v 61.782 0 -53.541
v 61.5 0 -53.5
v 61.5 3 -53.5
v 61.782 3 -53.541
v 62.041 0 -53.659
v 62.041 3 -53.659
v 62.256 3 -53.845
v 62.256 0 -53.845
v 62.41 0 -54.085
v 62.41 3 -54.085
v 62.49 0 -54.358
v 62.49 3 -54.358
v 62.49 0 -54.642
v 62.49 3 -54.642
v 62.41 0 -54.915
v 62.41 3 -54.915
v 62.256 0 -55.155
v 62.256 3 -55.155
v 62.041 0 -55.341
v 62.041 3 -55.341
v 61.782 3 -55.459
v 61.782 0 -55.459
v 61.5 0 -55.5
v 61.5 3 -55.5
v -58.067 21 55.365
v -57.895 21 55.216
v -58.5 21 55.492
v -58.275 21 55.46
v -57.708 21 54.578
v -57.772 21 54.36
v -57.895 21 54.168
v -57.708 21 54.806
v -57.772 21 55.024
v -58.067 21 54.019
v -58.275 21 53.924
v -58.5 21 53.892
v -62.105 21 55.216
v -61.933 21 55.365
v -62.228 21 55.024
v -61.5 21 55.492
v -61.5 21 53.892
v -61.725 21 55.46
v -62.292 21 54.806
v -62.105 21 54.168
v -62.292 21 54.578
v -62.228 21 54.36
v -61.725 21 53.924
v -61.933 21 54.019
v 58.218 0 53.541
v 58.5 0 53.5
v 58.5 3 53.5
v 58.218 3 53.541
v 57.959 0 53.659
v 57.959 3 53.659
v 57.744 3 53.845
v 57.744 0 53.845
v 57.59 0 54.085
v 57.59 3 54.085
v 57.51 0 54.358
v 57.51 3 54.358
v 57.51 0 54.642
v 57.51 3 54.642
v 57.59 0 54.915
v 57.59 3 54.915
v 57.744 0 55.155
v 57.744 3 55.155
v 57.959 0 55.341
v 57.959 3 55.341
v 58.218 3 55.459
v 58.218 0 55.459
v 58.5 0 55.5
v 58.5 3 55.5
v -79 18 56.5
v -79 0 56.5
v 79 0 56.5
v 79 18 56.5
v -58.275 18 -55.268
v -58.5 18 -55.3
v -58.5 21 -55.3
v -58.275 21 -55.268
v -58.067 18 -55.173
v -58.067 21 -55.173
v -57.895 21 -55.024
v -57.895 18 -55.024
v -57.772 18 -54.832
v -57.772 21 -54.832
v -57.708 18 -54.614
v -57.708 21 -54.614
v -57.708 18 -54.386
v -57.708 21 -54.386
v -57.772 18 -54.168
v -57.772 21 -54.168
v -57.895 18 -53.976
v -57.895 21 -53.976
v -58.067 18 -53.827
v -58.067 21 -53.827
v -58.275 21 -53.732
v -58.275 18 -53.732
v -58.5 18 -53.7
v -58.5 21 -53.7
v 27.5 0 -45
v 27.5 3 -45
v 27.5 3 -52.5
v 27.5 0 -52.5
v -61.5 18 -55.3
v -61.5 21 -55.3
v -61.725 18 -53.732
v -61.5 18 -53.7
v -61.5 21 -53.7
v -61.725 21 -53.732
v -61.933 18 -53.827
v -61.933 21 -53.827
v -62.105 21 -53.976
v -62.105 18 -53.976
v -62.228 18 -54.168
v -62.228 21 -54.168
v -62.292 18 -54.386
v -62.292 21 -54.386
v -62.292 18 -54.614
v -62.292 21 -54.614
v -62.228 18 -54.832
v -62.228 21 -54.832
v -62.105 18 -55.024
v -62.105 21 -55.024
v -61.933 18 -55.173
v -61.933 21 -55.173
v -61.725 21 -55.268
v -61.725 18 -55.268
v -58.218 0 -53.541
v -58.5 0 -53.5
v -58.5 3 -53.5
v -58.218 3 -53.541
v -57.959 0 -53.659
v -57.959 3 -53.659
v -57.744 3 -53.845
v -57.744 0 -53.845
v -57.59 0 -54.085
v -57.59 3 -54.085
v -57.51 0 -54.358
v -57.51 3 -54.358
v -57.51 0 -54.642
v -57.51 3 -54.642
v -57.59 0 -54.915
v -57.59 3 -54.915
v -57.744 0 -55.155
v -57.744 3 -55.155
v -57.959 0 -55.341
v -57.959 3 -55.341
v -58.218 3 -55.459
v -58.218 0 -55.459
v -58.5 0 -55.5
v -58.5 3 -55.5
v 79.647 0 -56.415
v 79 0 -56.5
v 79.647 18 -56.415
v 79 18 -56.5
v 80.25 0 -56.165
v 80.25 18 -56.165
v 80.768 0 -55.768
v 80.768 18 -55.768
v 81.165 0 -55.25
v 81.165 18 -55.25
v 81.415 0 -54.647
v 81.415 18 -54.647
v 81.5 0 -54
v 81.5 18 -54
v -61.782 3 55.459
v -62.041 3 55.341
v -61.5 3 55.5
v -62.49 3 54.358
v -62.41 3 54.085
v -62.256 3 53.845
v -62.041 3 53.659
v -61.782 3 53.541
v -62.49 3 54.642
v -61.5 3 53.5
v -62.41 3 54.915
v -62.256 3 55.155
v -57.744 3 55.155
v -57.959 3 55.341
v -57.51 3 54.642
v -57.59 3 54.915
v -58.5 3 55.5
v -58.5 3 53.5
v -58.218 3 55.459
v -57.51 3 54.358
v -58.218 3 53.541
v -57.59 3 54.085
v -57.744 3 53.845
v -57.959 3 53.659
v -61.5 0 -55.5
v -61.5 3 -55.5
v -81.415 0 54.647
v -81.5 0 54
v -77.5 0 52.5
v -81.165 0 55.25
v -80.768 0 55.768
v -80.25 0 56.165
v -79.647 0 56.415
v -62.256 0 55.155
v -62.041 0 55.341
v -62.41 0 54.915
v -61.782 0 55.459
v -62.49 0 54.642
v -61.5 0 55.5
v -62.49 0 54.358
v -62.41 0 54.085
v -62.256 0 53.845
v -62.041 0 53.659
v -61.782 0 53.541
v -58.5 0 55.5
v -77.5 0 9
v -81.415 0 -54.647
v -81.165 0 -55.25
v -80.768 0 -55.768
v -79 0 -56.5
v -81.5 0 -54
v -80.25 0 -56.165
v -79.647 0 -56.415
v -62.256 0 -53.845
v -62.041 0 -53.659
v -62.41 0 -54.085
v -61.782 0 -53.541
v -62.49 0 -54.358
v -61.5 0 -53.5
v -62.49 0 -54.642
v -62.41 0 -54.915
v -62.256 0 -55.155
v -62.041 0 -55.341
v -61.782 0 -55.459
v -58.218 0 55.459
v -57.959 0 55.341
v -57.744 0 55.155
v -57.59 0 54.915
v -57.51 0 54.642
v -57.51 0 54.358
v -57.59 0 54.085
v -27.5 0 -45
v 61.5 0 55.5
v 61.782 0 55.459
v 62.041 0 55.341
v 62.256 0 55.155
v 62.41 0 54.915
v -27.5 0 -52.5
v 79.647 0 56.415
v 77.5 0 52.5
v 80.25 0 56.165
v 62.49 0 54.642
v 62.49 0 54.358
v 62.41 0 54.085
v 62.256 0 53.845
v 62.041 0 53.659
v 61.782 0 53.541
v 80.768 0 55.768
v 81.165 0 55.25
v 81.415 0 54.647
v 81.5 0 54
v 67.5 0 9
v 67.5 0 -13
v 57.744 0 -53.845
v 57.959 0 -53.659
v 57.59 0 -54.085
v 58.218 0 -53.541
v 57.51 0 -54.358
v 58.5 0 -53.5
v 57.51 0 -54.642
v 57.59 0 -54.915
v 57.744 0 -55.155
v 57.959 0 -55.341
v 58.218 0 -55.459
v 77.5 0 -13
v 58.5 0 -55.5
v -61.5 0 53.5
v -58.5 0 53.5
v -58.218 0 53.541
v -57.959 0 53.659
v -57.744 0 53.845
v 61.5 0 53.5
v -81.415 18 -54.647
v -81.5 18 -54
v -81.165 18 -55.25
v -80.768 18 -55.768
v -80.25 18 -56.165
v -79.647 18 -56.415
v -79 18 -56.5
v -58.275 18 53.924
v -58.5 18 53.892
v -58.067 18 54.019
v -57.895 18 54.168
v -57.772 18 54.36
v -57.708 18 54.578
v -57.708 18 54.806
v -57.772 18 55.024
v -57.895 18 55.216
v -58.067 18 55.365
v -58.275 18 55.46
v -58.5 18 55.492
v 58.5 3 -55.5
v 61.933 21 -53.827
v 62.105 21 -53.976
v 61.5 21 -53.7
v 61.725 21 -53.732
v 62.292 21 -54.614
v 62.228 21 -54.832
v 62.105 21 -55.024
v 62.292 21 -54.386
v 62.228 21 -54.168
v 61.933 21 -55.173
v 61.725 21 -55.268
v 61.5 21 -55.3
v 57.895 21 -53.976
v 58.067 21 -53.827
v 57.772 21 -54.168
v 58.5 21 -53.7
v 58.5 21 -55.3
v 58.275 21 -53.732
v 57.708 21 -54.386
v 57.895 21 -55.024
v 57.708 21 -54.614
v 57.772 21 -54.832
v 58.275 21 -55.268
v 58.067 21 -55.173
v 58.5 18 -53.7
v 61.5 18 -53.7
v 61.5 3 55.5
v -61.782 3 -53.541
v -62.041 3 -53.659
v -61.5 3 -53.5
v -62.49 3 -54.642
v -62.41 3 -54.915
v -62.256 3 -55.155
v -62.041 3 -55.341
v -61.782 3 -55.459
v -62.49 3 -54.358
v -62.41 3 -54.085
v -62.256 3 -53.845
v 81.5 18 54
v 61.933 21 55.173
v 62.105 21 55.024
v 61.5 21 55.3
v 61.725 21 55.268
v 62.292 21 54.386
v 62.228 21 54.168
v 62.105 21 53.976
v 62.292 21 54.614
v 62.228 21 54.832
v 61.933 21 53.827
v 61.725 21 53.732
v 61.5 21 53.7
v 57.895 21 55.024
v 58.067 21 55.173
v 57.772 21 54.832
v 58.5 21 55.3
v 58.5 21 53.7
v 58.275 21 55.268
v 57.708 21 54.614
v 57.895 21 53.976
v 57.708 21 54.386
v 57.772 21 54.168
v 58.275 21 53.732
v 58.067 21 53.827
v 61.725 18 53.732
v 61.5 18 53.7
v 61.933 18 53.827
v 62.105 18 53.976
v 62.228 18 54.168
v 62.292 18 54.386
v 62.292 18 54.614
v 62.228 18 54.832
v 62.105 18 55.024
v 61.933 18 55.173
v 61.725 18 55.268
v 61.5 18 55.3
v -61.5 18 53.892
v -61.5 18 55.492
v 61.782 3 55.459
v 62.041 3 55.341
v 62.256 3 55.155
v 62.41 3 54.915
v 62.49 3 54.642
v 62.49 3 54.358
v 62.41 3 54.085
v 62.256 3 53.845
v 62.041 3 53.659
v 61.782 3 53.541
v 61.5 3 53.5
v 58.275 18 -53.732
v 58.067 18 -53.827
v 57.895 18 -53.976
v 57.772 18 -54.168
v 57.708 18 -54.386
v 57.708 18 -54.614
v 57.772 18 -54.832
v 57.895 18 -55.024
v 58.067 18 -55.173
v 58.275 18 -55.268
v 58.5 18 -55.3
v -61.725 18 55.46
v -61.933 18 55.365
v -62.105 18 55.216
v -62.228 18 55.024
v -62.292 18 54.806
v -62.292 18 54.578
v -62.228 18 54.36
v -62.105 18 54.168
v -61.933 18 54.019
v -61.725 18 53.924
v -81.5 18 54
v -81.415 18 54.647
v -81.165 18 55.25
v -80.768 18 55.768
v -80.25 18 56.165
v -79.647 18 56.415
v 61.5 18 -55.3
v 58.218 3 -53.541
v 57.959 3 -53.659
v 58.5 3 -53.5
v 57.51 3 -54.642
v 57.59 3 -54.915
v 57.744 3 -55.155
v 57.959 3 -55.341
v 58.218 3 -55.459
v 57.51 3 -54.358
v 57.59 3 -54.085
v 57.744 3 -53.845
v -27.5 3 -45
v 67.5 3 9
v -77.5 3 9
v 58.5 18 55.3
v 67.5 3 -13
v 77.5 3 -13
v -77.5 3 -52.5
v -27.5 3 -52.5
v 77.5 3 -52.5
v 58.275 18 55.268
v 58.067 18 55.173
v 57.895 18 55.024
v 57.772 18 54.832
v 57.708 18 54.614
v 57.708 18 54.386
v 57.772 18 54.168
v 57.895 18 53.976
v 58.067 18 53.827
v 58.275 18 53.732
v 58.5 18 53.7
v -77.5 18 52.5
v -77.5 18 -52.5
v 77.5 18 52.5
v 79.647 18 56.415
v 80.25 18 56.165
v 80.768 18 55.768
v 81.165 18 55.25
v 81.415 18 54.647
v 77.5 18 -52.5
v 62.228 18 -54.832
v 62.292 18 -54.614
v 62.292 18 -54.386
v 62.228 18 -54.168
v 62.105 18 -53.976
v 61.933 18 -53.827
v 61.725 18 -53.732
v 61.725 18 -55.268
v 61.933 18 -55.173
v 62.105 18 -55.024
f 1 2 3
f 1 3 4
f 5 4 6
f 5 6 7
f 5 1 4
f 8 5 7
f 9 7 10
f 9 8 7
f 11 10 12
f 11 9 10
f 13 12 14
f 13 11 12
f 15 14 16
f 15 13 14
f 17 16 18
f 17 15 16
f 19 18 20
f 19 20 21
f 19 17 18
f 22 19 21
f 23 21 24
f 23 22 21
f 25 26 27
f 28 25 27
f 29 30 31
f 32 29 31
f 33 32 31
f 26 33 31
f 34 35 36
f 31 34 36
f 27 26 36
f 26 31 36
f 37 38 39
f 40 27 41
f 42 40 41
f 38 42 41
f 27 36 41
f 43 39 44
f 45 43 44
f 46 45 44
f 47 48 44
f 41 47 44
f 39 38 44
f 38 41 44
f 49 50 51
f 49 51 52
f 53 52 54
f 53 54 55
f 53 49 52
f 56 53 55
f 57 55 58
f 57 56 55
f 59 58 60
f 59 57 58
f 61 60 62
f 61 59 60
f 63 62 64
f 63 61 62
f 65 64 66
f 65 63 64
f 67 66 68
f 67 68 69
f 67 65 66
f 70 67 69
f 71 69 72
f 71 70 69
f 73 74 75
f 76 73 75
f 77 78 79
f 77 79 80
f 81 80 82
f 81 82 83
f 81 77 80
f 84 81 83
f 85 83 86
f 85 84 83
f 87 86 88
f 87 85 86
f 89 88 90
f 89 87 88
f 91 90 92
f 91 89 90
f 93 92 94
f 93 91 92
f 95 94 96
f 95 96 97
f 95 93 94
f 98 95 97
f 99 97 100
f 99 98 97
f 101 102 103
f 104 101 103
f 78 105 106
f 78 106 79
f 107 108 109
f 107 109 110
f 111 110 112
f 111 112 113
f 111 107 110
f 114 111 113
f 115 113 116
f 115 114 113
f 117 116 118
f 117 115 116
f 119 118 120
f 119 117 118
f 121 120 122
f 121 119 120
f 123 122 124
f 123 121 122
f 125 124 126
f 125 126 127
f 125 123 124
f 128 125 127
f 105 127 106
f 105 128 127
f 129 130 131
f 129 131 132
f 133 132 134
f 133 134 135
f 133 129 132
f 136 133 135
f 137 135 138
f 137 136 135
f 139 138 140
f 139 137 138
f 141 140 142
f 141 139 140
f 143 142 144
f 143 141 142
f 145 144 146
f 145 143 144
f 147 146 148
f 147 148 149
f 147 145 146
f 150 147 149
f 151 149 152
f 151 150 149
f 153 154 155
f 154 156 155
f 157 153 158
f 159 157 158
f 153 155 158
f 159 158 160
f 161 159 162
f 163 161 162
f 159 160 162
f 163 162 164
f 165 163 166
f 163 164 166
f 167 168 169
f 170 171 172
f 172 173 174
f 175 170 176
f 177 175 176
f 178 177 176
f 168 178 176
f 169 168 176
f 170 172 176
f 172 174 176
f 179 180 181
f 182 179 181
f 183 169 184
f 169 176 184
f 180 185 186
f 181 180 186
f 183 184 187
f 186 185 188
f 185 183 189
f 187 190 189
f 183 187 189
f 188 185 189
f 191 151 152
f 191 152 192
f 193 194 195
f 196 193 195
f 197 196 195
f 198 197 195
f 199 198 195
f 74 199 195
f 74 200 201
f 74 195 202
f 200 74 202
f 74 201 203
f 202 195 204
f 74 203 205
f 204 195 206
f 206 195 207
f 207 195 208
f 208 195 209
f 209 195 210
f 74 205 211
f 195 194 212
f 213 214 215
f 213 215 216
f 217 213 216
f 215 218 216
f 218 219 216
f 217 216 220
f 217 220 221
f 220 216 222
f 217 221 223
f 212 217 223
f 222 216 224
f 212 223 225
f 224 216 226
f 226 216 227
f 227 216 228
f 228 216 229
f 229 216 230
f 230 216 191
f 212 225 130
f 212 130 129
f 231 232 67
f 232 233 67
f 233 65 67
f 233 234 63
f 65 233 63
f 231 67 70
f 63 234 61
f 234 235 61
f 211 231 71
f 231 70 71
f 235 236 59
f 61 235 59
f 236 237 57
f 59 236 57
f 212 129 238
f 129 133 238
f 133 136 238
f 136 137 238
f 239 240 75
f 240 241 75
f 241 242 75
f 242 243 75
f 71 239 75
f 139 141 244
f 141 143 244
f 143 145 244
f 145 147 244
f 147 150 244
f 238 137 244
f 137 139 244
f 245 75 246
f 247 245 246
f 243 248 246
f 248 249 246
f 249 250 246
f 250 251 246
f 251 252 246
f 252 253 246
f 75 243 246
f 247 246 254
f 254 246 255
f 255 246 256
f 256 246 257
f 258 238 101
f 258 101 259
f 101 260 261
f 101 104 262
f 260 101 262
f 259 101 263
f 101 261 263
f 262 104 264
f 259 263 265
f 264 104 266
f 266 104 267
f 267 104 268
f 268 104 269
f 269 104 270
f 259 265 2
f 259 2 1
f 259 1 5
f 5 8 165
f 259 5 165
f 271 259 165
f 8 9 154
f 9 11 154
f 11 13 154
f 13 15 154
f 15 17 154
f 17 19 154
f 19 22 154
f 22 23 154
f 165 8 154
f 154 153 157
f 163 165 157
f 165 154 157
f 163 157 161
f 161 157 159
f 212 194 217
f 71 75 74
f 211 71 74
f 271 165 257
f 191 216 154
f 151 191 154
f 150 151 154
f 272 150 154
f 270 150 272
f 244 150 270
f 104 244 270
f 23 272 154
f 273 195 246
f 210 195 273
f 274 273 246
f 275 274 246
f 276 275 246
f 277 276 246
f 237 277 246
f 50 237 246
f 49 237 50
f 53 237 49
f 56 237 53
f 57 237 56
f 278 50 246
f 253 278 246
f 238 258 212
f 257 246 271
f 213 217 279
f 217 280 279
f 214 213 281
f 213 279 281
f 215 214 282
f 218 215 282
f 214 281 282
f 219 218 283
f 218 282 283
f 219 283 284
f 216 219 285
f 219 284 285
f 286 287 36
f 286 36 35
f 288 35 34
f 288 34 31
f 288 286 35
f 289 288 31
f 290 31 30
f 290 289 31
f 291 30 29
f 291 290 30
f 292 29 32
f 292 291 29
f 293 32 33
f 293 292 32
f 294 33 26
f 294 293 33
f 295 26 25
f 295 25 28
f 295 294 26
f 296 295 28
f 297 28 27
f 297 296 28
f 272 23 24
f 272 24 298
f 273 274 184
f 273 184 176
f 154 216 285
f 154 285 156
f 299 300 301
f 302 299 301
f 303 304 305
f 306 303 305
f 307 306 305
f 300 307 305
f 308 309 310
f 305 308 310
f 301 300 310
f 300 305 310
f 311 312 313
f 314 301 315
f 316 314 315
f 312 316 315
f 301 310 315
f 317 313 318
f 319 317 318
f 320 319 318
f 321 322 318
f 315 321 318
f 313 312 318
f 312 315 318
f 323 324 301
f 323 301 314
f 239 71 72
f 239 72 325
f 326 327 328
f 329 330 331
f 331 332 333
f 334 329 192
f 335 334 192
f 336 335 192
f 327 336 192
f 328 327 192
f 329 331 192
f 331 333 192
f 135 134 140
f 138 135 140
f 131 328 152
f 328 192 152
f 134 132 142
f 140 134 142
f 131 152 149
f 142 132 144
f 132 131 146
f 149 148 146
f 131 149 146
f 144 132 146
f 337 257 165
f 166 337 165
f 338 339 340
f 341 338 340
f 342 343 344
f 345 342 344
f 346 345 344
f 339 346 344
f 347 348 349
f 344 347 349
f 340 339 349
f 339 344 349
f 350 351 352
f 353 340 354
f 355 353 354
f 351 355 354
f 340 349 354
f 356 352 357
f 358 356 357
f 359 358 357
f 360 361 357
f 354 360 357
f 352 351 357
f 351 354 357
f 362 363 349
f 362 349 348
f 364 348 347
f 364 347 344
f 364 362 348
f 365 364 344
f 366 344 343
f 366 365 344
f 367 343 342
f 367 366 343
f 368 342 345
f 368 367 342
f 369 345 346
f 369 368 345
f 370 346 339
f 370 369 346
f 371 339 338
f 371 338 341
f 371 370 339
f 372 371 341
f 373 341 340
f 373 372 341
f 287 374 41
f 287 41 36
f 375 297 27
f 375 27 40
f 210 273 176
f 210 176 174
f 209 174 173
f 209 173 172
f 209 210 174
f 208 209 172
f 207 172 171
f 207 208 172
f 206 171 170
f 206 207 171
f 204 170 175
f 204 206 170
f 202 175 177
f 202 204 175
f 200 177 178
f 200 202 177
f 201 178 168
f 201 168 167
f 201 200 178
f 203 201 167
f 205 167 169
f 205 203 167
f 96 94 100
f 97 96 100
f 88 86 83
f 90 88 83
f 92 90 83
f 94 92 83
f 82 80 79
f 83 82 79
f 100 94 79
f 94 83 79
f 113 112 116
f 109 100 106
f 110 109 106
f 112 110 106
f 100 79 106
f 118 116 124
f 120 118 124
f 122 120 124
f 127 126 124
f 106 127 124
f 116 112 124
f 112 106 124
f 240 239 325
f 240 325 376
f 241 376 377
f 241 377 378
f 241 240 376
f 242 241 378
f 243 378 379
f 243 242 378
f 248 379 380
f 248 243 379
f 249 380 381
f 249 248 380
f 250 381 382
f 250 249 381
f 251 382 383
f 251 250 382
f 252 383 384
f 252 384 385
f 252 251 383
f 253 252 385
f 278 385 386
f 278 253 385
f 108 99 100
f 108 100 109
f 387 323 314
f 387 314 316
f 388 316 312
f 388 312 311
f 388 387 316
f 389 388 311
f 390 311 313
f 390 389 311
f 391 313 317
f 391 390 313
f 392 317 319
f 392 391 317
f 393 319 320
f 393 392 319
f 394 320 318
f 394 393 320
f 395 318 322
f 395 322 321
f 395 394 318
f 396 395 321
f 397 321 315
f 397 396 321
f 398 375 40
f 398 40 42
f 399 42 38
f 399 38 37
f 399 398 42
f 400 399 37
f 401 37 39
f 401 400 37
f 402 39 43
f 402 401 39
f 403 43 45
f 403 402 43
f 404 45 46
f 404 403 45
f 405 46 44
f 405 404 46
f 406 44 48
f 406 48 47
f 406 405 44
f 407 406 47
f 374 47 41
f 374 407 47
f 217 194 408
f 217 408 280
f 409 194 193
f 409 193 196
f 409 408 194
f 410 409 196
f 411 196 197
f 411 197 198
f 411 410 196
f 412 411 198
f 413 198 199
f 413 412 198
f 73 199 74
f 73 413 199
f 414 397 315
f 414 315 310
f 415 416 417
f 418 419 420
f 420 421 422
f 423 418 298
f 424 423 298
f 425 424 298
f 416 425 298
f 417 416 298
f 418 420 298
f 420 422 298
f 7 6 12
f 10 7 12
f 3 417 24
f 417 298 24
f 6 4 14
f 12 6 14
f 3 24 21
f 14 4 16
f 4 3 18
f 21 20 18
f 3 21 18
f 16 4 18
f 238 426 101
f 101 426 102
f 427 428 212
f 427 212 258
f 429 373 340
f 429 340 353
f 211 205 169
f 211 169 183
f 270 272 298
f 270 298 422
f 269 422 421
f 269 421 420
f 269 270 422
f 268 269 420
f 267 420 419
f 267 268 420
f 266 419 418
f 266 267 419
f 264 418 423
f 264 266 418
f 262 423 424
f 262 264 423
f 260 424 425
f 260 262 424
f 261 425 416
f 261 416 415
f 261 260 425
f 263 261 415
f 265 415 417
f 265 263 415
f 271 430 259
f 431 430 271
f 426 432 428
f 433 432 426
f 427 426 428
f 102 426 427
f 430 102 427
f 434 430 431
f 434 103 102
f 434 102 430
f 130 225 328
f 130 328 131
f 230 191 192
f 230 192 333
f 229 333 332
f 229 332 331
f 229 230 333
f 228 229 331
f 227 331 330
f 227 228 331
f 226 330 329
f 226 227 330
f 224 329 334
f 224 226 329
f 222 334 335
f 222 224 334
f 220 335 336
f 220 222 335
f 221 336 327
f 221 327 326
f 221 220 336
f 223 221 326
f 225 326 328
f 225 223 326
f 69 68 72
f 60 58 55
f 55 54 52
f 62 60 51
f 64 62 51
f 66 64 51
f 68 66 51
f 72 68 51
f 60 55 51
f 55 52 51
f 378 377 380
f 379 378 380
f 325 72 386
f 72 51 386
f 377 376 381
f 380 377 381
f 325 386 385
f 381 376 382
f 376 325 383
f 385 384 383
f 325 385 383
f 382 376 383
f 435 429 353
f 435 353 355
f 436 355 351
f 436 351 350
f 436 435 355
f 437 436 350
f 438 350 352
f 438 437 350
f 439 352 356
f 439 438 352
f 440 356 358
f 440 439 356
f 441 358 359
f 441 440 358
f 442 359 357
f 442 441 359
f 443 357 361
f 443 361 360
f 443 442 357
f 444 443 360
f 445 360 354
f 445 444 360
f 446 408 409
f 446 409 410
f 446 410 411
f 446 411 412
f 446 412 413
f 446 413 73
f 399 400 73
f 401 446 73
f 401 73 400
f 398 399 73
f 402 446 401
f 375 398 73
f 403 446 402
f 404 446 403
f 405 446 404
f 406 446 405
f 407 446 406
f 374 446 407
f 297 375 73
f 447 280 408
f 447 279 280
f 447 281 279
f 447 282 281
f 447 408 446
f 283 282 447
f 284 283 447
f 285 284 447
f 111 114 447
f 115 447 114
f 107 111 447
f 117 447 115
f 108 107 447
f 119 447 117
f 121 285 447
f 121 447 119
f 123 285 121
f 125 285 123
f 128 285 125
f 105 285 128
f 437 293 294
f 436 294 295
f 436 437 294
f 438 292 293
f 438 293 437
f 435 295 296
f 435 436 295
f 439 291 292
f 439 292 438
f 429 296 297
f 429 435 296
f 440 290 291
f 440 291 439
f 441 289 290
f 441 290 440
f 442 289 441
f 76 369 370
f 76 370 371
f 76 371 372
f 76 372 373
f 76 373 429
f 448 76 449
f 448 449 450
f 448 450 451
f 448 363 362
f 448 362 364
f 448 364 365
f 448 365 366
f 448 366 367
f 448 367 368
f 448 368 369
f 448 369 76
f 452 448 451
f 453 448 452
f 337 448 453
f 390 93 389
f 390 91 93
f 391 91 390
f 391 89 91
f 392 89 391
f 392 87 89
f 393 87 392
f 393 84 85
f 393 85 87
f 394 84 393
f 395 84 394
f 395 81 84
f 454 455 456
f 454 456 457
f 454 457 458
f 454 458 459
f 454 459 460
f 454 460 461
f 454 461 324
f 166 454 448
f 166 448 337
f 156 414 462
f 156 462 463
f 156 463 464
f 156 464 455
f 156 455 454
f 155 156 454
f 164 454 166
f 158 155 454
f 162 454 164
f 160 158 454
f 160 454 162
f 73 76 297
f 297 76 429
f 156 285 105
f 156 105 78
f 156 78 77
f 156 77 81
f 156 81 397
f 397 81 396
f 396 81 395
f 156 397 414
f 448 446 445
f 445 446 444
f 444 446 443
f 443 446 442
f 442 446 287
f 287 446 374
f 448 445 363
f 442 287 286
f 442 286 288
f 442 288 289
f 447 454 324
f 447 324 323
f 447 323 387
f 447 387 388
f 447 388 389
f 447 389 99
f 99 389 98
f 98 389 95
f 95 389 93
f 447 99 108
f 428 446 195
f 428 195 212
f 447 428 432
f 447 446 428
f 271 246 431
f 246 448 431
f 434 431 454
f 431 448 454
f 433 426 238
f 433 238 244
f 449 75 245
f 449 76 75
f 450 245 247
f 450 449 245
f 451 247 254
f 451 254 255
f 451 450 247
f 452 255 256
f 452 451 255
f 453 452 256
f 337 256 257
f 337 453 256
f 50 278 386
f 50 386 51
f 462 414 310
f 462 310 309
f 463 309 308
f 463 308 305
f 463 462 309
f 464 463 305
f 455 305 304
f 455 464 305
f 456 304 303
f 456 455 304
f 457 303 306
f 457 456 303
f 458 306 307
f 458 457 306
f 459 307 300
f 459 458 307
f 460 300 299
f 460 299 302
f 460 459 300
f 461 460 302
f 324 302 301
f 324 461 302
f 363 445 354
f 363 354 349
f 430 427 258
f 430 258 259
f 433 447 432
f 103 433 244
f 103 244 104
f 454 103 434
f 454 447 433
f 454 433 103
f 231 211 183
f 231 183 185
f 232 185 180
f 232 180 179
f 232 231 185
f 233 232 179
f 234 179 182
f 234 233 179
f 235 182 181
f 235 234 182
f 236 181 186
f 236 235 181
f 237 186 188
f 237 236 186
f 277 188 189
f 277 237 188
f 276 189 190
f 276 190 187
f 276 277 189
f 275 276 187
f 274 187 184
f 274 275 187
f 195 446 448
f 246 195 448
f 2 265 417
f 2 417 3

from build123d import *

# Parameters (mm, degrees)
SKETCH3_W            = 163
SKETCH3_H            = 113
BOSS_EXTRUDE2_DEPTH  = 18
SKETCH4_W            = 155
SKETCH4_H            = 105
CUT_EXTRUDE2_DEPTH   = 15
FILLET1_R            = 2.5
SKETCH5_W            = 55
SKETCH5_H            = 7.5
TOPWIRES_DEPTH       = 3
SKETCH6_W            = 155
SKETCH6_H            = 43.5
MOTORWIRES_DEPTH     = 3
CONNECTORHOLES_DEPTH = 3
SKETCH14_W           = 10
SKETCH14_H           = 22
SIDEWIRES_DEPTH      = 3
BOSS_EXTRUDE7_DEPTH  = 3


with BuildPart() as part:
    # Sketch3 → Boss-Extrude2 (new body)
    with BuildSketch(Plane(origin=(0, 0, 0), x_dir=(1, 0, 0), z_dir=(0, 1, 0))):
        Rectangle(SKETCH3_W, SKETCH3_H)
    extrude(amount=BOSS_EXTRUDE2_DEPTH)

    # Sketch4 → Cut-Extrude2 (cut)
    with BuildSketch(Plane(origin=(0, 18, 0), x_dir=(1, 0, 0), z_dir=(0, 1, 0))):
        Rectangle(SKETCH4_W, SKETCH4_H)
    extrude(amount=-CUT_EXTRUDE2_DEPTH, mode=Mode.SUBTRACT)

    # Fillet1
    fillet1_edges = [part.edges().sort_by_distance(p)[0] for p in [
        (81.5, 9, 56.5),
        (-81.5, 9, 56.5),
        (-81.5, 9, -56.5),
        (81.5, 9, -56.5),
    ]]
    fillet(fillet1_edges, radius=FILLET1_R)

    # Sketch5 → TopWires (cut)
    with BuildSketch(Plane(origin=(0, 3, 0), x_dir=(1, 0, 0), z_dir=(0, 1, 0))):
        with Locations((0, 48.75)):
            Rectangle(SKETCH5_W, SKETCH5_H)
    extrude(amount=-TOPWIRES_DEPTH, mode=Mode.SUBTRACT)

    # Sketch6 → MotorWires (cut)
    with BuildSketch(Plane(origin=(0, 3, 0), x_dir=(1, 0, 0), z_dir=(0, 1, 0))):
        with Locations((0, -30.75)):
            Rectangle(SKETCH6_W, SKETCH6_H)
    extrude(amount=-MOTORWIRES_DEPTH, mode=Mode.SUBTRACT)

    # Sketch13 → ConnectorHoles (cut)
    with BuildSketch(Plane(origin=(0, 0, 0), x_dir=(-1, 0, 0), z_dir=(0, -1, 0))):
        with BuildLine():
            Line((61.5, 53.5), (58.5, 53.5))
            ThreePointArc((58.5, 53.5), (57.5, 54.5), (58.5, 55.5))
            Line((58.5, 55.5), (61.5, 55.5))
            ThreePointArc((61.5, 55.5), (62.5, 54.5), (61.5, 53.5))
        make_face()
        with BuildLine():
            Line((-58.5, 53.5), (-61.5, 53.5))
            ThreePointArc((-61.5, 53.5), (-62.5, 54.5), (-61.5, 55.5))
            Line((-61.5, 55.5), (-58.5, 55.5))
            ThreePointArc((-58.5, 55.5), (-57.5, 54.5), (-58.5, 53.5))
        make_face()
        with BuildLine():
            Line((61.5, -55.5), (58.5, -55.5))
            ThreePointArc((58.5, -55.5), (57.5, -54.5), (58.5, -53.5))
            Line((58.5, -53.5), (61.5, -53.5))
            ThreePointArc((61.5, -53.5), (62.5, -54.5), (61.5, -55.5))
        make_face()
        with BuildLine():
            Line((-61.5, -53.5), (-58.5, -53.5))
            ThreePointArc((-58.5, -53.5), (-57.5, -54.5), (-58.5, -55.5))
            Line((-58.5, -55.5), (-61.5, -55.5))
            ThreePointArc((-61.5, -55.5), (-62.5, -54.5), (-61.5, -53.5))
        make_face()
    extrude(amount=-CONNECTORHOLES_DEPTH, mode=Mode.SUBTRACT)

    # Sketch14 → SideWires (cut)
    with BuildSketch(Plane(origin=(0, 3, 0), x_dir=(1, 0, 0), z_dir=(0, 1, 0))):
        with Locations((72.5, 2)):
            Rectangle(SKETCH14_W, SKETCH14_H)
    extrude(amount=-SIDEWIRES_DEPTH, mode=Mode.SUBTRACT)

    # Sketch16 → Boss-Extrude7 (add)
    with BuildSketch(Plane(origin=(0, 18, 0), x_dir=(1, 0, 0), z_dir=(0, 1, 0))):
        with BuildLine():
            Line((61.5, -55.3), (58.5, -55.3))
            ThreePointArc((58.5, -55.3), (57.7, -54.5), (58.5, -53.7))
            Line((58.5, -53.7), (61.5, -53.7))
            ThreePointArc((61.5, -53.7), (62.3, -54.5), (61.5, -55.3))
        make_face()
        with BuildLine():
            Line((-58.5, -55.491947616), (-61.5, -55.491947616))
            ThreePointArc((-61.5, -55.491947616), (-62.3, -54.691947616), (-61.5, -53.891947616))
            Line((-61.5, -53.891947616), (-58.5, -53.891947616))
            ThreePointArc((-58.5, -53.891947616), (-57.7, -54.691947616), (-58.5, -55.491947616))
        make_face()
        with BuildLine():
            Line((-61.5, 55.3), (-58.5, 55.3))
            ThreePointArc((-58.5, 55.3), (-57.7, 54.5), (-58.5, 53.7))
            Line((-58.5, 53.7), (-61.5, 53.7))
            ThreePointArc((-61.5, 53.7), (-62.3, 54.5), (-61.5, 55.3))
        make_face()
        with BuildLine():
            Line((61.5, 53.7), (58.5, 53.7))
            ThreePointArc((58.5, 53.7), (57.7, 54.5), (58.5, 55.3))
            Line((58.5, 55.3), (61.5, 55.3))
            ThreePointArc((61.5, 55.3), (62.3, 54.5), (61.5, 53.7))
        make_face()
    extrude(amount=BOSS_EXTRUDE7_DEPTH)


solid = part.part
